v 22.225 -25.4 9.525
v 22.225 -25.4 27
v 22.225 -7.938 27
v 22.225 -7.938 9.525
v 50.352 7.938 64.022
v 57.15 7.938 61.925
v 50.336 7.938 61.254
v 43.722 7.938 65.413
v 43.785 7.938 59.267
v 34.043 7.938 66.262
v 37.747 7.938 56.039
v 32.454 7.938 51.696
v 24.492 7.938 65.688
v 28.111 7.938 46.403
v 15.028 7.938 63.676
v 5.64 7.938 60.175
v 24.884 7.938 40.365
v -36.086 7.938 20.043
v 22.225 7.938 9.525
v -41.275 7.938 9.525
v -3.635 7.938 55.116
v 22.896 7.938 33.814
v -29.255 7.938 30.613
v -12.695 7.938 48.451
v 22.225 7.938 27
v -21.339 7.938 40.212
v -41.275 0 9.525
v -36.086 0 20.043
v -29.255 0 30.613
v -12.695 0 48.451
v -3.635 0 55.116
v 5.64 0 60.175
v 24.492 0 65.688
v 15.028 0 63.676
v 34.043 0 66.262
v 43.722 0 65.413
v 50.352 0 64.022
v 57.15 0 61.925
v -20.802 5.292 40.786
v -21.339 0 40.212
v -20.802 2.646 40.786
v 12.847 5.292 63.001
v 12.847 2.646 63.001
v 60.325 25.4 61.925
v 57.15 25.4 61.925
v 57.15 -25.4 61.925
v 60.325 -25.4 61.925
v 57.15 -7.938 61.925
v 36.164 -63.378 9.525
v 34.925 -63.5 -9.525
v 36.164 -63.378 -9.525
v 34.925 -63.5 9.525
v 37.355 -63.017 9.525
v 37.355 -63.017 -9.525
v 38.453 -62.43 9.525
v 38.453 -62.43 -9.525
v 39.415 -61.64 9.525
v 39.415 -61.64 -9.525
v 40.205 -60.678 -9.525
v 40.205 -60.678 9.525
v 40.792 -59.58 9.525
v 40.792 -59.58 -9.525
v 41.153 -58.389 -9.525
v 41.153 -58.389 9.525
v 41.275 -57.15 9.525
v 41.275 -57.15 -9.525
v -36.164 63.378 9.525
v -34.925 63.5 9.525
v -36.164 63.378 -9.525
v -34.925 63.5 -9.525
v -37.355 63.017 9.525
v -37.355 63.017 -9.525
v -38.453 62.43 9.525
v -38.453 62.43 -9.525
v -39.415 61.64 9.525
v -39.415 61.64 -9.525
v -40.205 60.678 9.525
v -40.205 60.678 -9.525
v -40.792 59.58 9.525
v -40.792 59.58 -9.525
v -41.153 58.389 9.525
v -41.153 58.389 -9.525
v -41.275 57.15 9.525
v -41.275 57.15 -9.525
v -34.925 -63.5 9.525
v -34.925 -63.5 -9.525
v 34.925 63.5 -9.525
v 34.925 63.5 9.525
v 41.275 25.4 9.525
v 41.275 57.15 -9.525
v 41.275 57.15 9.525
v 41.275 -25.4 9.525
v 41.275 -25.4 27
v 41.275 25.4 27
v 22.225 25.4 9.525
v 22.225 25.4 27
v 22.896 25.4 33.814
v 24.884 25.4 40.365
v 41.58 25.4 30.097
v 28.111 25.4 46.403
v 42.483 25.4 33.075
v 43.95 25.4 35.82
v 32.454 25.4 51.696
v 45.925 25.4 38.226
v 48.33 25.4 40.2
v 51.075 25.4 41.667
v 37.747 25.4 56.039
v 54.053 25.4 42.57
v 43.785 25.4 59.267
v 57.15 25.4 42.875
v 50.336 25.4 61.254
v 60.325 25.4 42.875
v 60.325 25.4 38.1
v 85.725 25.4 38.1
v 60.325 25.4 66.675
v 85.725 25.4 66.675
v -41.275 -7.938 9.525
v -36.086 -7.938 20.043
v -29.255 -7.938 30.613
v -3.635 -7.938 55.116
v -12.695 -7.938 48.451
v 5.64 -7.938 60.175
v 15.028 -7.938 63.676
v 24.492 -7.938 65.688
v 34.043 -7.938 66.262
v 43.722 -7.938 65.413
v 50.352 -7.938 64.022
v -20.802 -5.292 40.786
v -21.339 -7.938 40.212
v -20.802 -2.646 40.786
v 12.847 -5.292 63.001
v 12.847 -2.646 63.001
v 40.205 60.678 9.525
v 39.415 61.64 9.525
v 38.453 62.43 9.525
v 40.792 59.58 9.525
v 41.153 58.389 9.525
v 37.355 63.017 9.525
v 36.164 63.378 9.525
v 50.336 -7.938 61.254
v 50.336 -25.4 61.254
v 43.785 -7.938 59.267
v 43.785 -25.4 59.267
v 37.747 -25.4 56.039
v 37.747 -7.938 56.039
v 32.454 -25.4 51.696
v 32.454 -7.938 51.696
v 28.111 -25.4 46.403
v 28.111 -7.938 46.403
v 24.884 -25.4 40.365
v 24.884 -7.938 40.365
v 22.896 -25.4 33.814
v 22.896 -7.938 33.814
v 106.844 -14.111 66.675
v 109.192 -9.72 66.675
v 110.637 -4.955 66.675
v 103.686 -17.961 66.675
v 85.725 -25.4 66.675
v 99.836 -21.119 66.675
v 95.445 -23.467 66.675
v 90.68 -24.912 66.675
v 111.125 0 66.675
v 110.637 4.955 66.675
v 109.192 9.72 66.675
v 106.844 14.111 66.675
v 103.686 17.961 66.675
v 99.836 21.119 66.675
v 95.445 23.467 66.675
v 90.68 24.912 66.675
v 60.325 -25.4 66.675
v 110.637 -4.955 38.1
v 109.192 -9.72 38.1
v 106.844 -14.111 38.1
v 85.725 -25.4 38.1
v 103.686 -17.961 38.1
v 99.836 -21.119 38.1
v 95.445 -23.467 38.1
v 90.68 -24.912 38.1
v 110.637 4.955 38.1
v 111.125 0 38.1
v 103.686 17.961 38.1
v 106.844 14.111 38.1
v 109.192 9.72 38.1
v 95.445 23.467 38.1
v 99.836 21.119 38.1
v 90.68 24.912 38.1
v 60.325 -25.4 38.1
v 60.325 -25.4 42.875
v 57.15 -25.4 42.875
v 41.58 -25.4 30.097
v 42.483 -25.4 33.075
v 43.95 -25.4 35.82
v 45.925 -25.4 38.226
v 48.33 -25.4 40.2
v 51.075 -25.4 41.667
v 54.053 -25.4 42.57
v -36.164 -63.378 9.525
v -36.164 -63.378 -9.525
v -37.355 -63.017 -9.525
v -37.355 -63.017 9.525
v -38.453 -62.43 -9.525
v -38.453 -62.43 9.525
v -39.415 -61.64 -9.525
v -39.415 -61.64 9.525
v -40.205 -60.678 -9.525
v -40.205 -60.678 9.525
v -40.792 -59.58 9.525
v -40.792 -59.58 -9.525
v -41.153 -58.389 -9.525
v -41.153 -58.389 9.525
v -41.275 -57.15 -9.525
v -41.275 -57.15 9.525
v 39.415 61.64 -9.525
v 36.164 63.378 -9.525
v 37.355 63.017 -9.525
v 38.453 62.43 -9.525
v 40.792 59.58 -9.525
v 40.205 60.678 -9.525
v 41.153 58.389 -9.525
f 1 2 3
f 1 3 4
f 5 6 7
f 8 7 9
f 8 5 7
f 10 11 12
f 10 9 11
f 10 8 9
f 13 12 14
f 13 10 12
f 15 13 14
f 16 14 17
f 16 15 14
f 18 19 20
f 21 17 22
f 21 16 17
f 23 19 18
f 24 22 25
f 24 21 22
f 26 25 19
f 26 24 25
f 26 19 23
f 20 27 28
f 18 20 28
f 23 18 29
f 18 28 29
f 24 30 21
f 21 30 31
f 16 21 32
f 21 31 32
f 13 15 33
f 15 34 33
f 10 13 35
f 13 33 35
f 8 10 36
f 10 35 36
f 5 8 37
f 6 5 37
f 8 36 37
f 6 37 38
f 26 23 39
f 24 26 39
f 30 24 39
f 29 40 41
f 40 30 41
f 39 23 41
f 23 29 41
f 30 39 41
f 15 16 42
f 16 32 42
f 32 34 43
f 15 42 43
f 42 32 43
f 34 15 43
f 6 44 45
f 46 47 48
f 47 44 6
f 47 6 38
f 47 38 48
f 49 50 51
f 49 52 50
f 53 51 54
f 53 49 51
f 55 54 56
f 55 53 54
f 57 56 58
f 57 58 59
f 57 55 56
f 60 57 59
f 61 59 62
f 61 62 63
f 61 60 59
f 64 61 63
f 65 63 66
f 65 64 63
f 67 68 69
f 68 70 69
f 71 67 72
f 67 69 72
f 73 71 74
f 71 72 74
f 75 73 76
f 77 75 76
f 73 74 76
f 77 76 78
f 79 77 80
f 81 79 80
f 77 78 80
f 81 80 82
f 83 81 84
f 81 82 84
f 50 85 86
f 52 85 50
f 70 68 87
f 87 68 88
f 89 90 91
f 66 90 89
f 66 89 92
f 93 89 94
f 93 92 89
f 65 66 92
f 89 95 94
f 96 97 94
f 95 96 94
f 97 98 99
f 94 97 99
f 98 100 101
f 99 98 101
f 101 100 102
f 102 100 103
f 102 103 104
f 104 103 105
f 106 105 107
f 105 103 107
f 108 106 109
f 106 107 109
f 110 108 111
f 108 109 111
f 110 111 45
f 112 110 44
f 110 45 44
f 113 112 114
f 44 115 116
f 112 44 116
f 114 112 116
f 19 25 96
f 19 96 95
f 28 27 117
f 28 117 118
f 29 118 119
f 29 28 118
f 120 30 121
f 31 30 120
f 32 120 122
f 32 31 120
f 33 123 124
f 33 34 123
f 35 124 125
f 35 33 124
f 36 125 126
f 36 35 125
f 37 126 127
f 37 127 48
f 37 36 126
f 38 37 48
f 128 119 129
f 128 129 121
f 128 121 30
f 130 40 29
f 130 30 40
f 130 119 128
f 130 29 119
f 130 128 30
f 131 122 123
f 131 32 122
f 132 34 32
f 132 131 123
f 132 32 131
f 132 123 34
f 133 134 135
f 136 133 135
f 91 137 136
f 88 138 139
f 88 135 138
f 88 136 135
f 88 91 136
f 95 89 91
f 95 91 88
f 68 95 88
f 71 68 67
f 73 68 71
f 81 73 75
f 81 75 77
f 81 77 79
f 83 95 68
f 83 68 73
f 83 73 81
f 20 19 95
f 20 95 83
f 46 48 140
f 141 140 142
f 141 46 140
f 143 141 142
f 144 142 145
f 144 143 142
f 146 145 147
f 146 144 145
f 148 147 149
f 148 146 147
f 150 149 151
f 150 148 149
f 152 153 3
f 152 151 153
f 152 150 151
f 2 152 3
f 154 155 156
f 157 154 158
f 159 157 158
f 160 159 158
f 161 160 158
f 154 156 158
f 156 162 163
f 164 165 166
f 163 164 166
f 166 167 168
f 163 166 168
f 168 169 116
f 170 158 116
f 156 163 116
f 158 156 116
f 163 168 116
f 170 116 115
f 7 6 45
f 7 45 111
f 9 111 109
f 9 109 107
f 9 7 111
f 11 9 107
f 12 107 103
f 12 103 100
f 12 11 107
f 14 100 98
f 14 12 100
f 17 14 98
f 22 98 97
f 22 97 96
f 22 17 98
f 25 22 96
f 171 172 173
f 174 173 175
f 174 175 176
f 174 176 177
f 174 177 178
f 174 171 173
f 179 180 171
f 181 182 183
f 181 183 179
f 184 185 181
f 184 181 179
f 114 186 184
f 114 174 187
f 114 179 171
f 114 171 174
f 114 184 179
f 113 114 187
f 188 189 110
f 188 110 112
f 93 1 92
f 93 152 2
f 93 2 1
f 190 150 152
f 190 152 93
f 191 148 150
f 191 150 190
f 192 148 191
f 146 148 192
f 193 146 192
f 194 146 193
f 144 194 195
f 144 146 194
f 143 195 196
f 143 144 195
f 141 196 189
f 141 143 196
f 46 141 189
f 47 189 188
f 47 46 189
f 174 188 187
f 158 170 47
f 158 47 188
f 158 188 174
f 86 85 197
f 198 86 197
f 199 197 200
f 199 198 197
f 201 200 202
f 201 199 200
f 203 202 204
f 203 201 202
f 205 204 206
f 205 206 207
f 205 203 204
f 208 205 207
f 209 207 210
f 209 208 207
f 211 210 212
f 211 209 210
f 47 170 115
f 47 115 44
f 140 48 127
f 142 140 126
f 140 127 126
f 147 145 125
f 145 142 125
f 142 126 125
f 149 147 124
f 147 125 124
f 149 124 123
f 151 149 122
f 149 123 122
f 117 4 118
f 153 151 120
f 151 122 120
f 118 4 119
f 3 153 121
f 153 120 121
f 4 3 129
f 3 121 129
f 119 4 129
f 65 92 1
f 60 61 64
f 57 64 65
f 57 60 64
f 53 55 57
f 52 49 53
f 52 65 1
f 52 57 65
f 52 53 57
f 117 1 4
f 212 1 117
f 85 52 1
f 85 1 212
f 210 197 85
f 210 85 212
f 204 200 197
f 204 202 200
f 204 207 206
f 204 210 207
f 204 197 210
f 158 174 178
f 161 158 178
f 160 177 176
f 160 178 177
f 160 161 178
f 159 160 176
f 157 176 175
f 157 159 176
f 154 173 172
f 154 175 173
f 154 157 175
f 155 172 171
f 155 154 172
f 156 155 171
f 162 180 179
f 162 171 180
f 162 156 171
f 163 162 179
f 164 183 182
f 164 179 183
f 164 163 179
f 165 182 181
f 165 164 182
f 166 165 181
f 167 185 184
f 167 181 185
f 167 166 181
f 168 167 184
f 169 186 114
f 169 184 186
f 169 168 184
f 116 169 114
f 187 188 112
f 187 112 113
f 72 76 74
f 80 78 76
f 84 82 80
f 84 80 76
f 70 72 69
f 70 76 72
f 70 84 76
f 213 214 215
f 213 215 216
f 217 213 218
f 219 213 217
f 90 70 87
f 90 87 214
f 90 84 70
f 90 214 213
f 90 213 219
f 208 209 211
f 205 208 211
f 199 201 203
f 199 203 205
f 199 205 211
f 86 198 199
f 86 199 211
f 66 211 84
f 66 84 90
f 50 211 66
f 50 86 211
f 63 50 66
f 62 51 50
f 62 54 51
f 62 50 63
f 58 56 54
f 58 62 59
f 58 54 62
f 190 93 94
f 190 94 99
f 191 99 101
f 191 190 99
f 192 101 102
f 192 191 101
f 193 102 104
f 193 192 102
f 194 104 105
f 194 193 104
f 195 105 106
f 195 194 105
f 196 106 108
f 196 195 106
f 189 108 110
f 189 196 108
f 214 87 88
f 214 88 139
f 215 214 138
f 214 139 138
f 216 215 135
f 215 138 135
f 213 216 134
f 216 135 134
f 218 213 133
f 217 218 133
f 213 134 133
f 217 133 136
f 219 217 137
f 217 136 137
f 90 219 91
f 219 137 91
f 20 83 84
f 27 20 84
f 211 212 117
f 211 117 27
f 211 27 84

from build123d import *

# Parameters (mm, degrees)
F1_DEPTH = 63.5
F2_DEPTH = 25.4
F3_DEPTH = 7.9375
F0_W     = 25.4
F0_H     = 28.575
F5_R     = 6.35


with BuildPart() as f1:
    # F0 (on Front) → F1 (new body, symmetric)
    with BuildSketch(Plane.XZ):
        Polygon((-41.275, 9.525), (-41.275, -9.525), (41.275, -9.525), (41.275, 9.525), (22.225, 9.525), align=None)
    extrude(amount=F1_DEPTH, both=True)

    # F0 (on Front) → F2 (join, symmetric)
    with BuildSketch(Plane.XZ):
        with BuildLine():
            Line((22.225, 9.525), (41.275, 9.525))
            Line((41.275, 9.525), (41.275, 27.0002))
            ThreePointArc((41.275, 27.0002), (45.92468, 38.22552), (57.15, 42.8752))
            Line((57.15, 42.8752), (60.325, 42.8752))
            Line((60.325, 42.8752), (60.325, 61.9252))
            Line((60.325, 61.9252), (57.15, 61.9252))
            ThreePointArc((57.15, 61.9252), (32.454296, 51.695904), (22.225, 27.0002))
            Line((22.225, 27.0002), (22.225, 9.525))
        make_face()
        Polygon((60.325, 66.675), (60.325, 61.9252), (60.325, 42.8752), (60.325, 38.1), (85.725, 38.1), (85.725, 66.675), align=None)
    extrude(amount=F2_DEPTH, both=True)

    # F0 (on Front) → F3 (join, symmetric)
    with BuildSketch(Plane.XZ):
        with BuildLine():
            add(Edge.make_bspline(
                [(-41.275, 9.525), (-28.23109, 40.560842), (8.36162, 79.393923), (57.15, 61.9252)],
                knots=[0, 0, 0, 0, 111.504536, 111.504536, 111.504536, 111.504536], degree=3))
            Line((-41.275, 9.525), (22.225, 9.525))
            Line((22.225, 9.525), (22.225, 27.0002))
            ThreePointArc((22.225, 27.0002), (32.454296, 51.695904), (57.15, 61.9252))
        make_face()
    extrude(amount=F3_DEPTH, both=True)

    # F0 (on Front) → F4 (revolve)
    with BuildSketch(Plane.XZ):
        with Locations((98.425, 52.3875)):
            Rectangle(F0_W, F0_H)
    revolve(axis=Axis((85.725, 0, 52.3875), (0, 0, 1)))

    # F5
    f5_edges = [f1.edges().sort_by_distance(p)[0] for p in [
        (-41.275, -63.5, 0),
        (41.275, -63.5, 0),
        (41.275, 63.5, 0),
        (-41.275, 63.5, 0),
    ]]
    fillet(f5_edges, radius=F5_R)


solid = f1.part
